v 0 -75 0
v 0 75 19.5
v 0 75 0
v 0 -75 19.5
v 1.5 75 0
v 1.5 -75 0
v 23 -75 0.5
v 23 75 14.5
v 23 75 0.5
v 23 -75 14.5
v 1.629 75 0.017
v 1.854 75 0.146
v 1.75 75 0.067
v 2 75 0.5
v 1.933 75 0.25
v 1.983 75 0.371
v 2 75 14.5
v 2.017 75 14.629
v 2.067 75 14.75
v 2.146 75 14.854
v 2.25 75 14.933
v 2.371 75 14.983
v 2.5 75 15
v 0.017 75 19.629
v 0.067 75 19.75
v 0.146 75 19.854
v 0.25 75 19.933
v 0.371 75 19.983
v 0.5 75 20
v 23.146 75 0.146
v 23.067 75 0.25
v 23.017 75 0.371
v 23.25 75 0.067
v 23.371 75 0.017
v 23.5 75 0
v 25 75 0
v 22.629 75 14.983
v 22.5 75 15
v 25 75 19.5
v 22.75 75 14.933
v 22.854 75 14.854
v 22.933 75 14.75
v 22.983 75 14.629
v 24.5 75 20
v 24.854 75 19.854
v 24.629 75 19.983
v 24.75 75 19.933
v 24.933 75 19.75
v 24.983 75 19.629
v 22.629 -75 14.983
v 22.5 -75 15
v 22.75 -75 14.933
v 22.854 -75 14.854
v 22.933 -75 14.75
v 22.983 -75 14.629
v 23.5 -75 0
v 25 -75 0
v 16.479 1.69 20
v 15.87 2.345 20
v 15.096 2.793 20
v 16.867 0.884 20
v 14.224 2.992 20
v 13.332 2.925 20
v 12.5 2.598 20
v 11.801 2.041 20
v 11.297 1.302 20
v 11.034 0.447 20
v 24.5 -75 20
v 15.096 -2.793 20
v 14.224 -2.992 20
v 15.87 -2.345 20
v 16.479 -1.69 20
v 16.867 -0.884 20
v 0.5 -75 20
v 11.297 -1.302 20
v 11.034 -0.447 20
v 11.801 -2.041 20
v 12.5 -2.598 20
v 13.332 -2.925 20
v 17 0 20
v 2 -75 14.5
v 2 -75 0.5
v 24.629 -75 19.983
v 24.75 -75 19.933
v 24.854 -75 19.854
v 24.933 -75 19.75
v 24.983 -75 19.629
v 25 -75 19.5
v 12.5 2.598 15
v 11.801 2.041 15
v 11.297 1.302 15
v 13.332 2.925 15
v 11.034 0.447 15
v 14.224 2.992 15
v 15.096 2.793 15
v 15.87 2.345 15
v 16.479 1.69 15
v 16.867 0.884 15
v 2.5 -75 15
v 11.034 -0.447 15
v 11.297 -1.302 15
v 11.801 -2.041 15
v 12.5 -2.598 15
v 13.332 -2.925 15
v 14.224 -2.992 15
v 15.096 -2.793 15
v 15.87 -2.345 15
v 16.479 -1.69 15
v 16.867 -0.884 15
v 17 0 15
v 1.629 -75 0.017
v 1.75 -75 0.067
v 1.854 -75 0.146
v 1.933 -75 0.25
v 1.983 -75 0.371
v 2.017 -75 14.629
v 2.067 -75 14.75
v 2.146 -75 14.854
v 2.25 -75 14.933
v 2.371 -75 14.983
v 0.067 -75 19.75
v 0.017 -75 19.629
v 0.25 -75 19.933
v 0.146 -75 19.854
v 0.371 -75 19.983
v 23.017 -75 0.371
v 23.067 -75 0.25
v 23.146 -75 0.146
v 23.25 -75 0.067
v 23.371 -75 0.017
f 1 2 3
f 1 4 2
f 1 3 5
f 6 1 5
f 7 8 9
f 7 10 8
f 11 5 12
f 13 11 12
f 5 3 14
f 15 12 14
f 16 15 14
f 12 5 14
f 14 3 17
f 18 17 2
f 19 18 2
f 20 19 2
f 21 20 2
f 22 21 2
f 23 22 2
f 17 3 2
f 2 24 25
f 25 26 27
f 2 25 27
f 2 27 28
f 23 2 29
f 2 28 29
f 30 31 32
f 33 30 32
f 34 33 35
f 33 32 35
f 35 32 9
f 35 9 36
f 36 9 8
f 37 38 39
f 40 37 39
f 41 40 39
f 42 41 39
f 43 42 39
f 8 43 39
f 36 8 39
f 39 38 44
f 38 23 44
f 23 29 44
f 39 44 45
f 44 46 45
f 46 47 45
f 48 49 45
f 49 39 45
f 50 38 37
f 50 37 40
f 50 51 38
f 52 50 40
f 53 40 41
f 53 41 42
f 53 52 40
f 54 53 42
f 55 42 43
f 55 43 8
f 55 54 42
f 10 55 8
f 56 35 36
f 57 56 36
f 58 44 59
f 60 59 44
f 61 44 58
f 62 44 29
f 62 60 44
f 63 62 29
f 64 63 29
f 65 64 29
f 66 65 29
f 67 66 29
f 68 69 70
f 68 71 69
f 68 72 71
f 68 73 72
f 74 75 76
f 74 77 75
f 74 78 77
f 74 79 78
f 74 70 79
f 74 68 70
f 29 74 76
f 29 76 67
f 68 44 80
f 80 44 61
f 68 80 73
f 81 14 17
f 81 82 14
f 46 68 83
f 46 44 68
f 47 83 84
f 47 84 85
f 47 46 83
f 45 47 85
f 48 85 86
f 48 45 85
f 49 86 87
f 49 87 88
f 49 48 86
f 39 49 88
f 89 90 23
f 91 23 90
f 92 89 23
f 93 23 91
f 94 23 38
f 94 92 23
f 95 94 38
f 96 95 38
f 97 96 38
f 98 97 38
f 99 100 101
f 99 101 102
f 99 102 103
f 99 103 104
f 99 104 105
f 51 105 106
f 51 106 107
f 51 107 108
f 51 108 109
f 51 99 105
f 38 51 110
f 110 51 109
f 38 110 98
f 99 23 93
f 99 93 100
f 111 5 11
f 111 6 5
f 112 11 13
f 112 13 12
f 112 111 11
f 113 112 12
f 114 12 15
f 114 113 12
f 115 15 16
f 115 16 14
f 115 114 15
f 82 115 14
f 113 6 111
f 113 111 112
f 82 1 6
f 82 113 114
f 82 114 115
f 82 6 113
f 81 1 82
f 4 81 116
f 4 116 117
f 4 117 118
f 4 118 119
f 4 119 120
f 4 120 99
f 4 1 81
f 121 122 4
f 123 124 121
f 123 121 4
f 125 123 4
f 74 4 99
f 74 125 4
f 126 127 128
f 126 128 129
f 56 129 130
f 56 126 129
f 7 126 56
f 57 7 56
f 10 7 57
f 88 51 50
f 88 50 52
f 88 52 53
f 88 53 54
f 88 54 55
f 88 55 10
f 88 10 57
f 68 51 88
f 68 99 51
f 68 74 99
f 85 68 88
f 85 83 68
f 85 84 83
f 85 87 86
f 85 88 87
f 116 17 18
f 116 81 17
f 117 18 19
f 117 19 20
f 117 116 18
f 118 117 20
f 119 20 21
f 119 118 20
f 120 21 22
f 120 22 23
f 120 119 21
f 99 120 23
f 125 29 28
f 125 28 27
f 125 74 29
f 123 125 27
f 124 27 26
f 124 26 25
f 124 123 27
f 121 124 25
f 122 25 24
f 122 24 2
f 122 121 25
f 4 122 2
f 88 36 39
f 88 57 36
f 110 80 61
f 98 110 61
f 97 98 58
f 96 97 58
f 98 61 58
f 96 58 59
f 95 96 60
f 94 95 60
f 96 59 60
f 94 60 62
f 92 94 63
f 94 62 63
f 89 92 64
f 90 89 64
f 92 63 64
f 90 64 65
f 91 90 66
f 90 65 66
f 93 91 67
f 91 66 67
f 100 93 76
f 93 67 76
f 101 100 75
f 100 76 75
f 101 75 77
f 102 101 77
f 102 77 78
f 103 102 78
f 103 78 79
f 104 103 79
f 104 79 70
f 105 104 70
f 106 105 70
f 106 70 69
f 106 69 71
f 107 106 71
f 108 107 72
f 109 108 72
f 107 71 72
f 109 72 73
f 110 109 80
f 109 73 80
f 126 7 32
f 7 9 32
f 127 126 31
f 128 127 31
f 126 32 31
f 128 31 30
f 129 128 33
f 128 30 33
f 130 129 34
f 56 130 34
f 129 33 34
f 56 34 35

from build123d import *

# Parameters (mm, degrees)
F1_DEPTH = 75
F2_R     = 3
F3_DEPTH = 5
F4_R     = 0.5


with BuildPart() as f1:
    # F0 (on Front) → F1 (new body, symmetric)
    with BuildSketch(Plane.XZ):
        Polygon((25, 20), (0, 20), (0, 0), (2, 0), (2, 15), (23, 15), (23, 0), (25, 0), align=None)
    extrude(amount=F1_DEPTH, both=True)

    # F2 (on face) → F3 (cut, through all)
    with BuildSketch(Plane.XY.offset(20)):
        with Locations((14, 0)):
            Circle(F2_R)
    extrude(amount=-F3_DEPTH, mode=Mode.SUBTRACT)

    # F4
    f4_edges = [f1.edges().sort_by_distance(p)[0] for p in [
        (0, 0, 20),
        (25, 0, 20),
        (2, 0, 0),
        (2, 0, 15),
        (23, 0, 15),
        (23, 0, 0),
    ]]
    fillet(f4_edges, radius=F4_R)


solid = f1.part
